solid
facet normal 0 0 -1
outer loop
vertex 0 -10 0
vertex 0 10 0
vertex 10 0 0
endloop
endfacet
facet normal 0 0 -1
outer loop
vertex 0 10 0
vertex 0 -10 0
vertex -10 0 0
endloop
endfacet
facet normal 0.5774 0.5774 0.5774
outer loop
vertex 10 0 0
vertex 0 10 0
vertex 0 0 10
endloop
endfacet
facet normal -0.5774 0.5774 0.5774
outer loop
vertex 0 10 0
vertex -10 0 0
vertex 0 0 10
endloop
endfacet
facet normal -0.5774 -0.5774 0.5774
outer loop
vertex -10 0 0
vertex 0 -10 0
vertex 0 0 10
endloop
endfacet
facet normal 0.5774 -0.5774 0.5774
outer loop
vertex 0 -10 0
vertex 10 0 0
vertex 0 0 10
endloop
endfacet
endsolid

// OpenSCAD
/*
 *  OpenSCAD (www.openscad.org)
 *  Copyright (C) 2009-2011 Clifford Wolf <clifford@clifford.at> and
 *                          Marius Kintel <marius@kintel.net>
 *
 *  This program is free software; you can redistribute it and/or modify
 *  it under the terms of the GNU General Public License as published by
 *  the Free Software Foundation; either version 2 of the License, or
 *  (at your option) any later version.
 *
 *  This program is distributed in the hope that it will be useful,
 *  but WITHOUT ANY WARRANTY; without even the implied warranty of
 *  MERCHANTABILITY or FITNESS FOR A PARTICULAR PURPOSE.  See the
 *  GNU General Public License for more details.
 *
 *  You should have received a copy of the GNU General Public License
 *  along with this program; if not, write to the Free Software
 *  Foundation, Inc., 59 Temple Place, Suite 330, Boston, MA  02111-1307  USA
 *
 */
polyhedron(
	points = [
		[10, 0, 0],
		[0, 10, 0],
		[-10, 0, 0],
		[0, -10, 0],
		[0, 0, 10]
	],
	triangles = [
		[0, 1, 2, 3],
		[4, 1, 0],
		[4, 2, 1],
		[4, 3, 2],
		[4, 0, 3]
	]
);
